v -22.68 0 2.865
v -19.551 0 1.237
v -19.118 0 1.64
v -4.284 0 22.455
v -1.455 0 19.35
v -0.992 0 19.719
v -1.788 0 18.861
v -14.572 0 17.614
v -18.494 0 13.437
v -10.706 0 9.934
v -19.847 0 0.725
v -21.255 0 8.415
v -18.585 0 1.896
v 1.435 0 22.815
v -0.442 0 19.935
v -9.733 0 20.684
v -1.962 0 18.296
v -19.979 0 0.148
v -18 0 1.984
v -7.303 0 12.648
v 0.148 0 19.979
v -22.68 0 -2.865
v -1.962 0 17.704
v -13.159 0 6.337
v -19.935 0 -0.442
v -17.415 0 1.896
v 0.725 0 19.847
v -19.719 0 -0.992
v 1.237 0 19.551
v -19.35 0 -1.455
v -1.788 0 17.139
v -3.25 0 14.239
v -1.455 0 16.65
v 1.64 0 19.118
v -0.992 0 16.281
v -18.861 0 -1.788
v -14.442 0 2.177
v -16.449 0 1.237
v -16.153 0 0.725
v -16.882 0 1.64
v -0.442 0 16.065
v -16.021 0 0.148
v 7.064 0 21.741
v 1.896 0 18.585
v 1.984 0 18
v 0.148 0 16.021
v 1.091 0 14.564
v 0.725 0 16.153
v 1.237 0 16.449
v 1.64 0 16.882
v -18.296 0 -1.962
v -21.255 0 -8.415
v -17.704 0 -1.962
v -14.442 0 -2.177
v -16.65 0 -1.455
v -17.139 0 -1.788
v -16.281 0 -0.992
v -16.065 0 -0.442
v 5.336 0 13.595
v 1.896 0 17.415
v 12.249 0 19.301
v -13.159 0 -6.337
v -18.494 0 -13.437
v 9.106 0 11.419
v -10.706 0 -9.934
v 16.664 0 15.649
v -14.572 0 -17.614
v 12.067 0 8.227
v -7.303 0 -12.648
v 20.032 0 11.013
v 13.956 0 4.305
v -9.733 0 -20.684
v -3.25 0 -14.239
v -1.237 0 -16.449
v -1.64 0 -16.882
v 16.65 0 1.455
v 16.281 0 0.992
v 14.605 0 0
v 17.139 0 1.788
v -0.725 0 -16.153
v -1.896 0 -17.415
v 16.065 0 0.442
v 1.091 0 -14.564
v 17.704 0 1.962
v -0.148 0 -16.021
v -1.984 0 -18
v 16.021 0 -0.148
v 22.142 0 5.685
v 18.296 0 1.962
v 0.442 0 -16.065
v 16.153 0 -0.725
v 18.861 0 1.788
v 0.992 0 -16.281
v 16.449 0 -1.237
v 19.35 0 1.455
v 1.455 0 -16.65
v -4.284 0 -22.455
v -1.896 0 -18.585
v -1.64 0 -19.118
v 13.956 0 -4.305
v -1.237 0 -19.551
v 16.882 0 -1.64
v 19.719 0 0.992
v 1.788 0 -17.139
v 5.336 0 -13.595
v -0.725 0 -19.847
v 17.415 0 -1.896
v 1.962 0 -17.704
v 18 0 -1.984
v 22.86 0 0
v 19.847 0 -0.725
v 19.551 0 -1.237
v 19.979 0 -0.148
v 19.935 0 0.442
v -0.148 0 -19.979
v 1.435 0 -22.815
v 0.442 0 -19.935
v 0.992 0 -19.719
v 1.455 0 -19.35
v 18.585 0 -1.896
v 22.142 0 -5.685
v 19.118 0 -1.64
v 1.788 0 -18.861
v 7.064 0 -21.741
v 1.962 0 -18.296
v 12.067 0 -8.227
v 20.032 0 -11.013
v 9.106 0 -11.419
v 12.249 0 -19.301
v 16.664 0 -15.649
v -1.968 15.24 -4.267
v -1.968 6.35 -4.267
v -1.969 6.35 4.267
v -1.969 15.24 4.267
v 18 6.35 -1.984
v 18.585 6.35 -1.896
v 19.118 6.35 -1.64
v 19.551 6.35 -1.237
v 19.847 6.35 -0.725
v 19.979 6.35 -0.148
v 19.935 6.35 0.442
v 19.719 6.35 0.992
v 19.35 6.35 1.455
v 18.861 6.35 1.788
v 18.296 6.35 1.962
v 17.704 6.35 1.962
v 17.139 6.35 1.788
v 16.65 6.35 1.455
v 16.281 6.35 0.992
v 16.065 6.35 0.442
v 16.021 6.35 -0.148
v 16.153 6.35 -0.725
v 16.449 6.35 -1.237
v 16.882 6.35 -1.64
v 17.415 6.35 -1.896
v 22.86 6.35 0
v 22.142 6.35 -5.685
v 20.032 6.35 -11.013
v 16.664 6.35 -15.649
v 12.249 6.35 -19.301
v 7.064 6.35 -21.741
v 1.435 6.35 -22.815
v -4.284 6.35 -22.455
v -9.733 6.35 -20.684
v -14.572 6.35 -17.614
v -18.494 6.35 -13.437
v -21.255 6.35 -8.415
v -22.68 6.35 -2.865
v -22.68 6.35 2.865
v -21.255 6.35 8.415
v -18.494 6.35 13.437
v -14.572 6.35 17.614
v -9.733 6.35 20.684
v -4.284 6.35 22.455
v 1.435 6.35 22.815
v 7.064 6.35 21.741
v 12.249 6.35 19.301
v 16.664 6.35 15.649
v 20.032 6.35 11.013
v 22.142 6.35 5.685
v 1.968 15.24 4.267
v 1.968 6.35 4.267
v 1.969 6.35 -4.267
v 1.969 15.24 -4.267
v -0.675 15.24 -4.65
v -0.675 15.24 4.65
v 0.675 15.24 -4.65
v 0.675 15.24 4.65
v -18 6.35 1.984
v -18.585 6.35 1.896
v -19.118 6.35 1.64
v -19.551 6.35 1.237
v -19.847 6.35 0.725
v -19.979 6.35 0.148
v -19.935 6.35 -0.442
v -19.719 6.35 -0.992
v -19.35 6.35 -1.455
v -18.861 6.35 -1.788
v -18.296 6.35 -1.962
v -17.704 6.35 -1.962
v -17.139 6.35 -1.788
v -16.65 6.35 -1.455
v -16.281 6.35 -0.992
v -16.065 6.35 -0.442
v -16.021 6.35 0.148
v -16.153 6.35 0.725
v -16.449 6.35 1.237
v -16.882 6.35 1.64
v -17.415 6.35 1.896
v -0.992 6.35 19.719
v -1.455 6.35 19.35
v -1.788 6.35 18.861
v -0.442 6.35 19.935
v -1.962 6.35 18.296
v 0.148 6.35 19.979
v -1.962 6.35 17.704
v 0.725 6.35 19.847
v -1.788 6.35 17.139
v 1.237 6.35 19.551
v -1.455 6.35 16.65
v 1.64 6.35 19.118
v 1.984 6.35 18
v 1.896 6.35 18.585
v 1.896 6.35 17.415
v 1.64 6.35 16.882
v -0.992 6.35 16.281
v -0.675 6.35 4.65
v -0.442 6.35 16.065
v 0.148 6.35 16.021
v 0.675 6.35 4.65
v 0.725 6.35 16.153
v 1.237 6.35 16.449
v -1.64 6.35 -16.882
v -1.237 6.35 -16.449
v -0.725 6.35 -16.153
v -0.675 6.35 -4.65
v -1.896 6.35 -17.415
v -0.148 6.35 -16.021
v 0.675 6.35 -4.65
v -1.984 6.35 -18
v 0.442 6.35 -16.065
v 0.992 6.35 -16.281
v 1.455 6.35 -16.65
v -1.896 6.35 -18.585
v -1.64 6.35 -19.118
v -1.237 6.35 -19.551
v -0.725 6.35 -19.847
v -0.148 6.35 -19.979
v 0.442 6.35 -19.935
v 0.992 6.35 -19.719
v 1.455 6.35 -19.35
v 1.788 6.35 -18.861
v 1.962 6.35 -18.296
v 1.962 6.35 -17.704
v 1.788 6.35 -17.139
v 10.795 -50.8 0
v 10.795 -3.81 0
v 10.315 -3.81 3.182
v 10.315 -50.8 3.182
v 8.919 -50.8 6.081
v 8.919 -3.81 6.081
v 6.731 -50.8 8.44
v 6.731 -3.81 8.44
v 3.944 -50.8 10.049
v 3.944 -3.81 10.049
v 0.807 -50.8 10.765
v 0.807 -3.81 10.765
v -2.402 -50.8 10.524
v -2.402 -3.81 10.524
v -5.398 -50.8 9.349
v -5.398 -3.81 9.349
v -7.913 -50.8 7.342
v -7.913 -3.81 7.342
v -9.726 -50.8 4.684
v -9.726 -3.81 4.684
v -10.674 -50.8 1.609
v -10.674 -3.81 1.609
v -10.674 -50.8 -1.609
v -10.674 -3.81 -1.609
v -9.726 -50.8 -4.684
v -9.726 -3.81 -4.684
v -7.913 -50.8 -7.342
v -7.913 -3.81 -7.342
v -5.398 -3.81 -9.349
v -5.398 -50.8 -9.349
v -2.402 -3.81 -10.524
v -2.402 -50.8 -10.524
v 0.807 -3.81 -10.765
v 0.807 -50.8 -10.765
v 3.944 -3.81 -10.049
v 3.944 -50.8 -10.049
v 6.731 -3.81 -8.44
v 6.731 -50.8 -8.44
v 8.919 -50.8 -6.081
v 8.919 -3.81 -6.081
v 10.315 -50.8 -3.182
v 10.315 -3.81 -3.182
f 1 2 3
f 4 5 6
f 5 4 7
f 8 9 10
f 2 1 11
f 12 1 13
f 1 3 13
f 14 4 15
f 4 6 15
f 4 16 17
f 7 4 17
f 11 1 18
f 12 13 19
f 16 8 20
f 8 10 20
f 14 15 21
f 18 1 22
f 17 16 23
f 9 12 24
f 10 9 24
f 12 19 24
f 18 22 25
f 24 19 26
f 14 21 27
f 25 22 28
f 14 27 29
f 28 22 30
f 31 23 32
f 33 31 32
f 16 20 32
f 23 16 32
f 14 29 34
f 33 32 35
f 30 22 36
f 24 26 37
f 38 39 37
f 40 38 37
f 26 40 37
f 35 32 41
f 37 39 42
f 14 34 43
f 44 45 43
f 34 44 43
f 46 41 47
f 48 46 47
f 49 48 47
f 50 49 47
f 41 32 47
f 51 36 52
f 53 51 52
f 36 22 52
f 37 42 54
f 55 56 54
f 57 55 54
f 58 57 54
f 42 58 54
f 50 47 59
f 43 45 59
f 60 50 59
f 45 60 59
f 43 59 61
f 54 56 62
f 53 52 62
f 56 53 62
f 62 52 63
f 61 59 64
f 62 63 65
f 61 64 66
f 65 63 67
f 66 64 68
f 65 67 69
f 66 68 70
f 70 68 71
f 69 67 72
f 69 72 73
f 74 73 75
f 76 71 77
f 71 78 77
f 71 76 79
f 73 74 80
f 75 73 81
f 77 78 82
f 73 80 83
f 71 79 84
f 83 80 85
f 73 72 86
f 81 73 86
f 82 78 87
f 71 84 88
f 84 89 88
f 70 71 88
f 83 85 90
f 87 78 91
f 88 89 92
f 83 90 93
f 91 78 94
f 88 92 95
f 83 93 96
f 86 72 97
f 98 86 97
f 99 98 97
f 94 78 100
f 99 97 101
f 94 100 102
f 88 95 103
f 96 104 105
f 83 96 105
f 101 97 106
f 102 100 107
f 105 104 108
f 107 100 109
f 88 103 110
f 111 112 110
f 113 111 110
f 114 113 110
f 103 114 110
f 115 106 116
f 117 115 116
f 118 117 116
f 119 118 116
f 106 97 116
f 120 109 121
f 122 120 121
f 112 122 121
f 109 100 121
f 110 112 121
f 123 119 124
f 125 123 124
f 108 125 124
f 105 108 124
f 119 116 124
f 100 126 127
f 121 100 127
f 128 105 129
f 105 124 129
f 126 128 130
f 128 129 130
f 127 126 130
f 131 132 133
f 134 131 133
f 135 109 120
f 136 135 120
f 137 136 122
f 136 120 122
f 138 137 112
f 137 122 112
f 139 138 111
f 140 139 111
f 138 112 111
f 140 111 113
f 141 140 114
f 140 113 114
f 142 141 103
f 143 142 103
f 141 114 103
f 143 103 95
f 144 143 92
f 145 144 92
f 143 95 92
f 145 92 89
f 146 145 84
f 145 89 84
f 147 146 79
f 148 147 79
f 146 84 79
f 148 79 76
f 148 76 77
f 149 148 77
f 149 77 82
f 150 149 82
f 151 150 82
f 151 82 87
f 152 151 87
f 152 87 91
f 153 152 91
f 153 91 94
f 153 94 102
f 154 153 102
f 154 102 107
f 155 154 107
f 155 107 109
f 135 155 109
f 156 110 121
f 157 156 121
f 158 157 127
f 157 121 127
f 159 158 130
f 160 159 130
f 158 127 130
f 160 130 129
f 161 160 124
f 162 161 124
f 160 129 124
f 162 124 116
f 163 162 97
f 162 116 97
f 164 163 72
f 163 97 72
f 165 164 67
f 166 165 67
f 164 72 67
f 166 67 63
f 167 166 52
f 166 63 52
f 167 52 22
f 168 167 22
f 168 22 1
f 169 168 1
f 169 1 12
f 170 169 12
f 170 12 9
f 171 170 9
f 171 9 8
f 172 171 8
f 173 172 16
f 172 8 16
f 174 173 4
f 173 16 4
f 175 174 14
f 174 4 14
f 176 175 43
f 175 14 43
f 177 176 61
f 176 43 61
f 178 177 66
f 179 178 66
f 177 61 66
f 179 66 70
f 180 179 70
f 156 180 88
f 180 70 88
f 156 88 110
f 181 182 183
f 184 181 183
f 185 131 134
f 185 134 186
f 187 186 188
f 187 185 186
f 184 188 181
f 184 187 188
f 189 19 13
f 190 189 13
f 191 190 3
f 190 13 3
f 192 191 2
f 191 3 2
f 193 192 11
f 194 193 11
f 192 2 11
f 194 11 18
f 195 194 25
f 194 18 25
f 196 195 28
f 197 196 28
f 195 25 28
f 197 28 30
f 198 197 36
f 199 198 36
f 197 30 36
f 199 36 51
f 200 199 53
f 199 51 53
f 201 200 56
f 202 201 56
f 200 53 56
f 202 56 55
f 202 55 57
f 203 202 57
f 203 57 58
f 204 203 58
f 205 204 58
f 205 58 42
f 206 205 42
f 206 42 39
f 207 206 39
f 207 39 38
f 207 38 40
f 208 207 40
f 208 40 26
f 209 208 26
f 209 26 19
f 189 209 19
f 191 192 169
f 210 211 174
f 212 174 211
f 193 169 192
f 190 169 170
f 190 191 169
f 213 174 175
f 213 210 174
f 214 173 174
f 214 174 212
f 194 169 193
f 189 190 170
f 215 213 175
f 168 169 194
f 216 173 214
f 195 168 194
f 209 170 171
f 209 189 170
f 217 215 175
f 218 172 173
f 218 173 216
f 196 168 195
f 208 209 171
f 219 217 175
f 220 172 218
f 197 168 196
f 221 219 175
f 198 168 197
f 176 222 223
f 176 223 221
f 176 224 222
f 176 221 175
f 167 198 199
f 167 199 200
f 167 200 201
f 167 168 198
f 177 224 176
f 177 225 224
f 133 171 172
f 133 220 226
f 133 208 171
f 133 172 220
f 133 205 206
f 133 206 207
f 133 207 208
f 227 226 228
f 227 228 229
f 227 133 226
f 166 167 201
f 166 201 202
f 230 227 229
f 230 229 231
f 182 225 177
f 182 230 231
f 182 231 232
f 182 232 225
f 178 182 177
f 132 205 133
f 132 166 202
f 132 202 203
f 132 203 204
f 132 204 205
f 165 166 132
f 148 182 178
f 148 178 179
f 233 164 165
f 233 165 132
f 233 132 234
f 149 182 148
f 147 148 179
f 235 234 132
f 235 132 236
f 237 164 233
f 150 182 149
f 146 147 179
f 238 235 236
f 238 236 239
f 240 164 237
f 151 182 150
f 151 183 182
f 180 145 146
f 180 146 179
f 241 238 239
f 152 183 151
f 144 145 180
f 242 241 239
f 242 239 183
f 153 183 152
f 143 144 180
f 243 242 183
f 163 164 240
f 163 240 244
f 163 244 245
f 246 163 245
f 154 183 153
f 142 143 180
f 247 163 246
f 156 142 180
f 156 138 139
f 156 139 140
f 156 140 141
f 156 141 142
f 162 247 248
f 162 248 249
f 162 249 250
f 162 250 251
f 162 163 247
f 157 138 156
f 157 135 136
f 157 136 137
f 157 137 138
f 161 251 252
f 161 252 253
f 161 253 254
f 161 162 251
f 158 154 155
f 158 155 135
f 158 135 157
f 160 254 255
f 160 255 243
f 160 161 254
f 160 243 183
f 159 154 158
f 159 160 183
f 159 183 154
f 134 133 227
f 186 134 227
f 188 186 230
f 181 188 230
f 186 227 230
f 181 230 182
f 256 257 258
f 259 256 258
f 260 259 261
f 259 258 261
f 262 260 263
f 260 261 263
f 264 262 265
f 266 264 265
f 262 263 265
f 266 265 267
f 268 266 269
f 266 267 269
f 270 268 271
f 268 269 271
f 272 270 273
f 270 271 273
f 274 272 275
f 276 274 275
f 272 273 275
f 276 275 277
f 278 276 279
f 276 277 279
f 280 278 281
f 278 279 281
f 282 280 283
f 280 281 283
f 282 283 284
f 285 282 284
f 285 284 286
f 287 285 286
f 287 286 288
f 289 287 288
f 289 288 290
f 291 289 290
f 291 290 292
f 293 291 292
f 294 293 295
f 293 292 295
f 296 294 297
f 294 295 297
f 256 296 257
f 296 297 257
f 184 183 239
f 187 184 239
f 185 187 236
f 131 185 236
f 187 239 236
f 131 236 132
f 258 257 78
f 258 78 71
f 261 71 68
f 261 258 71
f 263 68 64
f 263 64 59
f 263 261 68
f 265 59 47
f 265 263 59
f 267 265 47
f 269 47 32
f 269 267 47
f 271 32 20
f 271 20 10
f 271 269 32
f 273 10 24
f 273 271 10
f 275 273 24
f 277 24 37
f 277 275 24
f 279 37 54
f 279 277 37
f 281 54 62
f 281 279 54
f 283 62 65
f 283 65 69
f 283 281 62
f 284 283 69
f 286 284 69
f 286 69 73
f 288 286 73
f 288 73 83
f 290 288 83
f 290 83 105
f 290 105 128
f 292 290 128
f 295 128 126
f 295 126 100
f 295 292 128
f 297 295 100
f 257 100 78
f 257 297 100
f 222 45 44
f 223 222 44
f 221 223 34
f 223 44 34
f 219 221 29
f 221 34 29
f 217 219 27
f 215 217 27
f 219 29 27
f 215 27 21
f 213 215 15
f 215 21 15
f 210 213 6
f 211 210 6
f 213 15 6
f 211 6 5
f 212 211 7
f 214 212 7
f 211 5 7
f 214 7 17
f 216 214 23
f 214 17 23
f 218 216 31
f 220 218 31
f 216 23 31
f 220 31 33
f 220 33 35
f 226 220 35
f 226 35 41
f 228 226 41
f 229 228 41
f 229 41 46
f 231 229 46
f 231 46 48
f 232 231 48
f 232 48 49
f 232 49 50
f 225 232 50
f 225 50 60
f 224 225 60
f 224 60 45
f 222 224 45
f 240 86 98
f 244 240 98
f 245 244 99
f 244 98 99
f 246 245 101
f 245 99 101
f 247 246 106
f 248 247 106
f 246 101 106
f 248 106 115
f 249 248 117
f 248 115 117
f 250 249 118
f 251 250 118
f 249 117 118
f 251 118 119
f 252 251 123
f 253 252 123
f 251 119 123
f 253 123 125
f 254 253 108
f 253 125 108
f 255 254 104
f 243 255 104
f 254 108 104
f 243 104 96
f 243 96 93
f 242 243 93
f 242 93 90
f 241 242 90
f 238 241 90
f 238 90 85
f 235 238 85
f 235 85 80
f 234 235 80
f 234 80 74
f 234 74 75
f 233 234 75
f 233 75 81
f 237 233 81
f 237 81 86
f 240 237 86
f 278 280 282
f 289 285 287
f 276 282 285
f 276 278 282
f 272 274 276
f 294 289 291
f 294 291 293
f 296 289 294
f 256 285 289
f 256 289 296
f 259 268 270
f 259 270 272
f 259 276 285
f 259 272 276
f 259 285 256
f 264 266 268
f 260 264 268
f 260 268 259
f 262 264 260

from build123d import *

# Parameters (mm, degrees)
SKETCH1_R                           = 22.86
BOSS_EXTRUDE1_DEPTH                 = 6.35
BOSS_EXTRUDE2_DEPTH                 = 8.89
SKETCH3_R                           = 10.795
BOSS_EXTRUDE3_DEPTH                 = 50.8
CHAMFER1_SIZE                       = 3.81
F_5_32_0_15625_DIAMETER_HOLE1_D     = 3.96875
F_5_32_0_15625_DIAMETER_HOLE1_DEPTH = 6.351
CIRPATTERN1_COUNT                   = 4


with BuildPart() as part:
    # Sketch1 → Boss-Extrude1 (new body)
    with BuildSketch(Plane(origin=(0, 0, 0), x_dir=(1, 0, 0), z_dir=(0, 1, 0))):
        Circle(SKETCH1_R)
    extrude(amount=BOSS_EXTRUDE1_DEPTH)

    # Sketch2 → Boss-Extrude2 (add)
    with BuildSketch(Plane(origin=(0, 6.35, 0), x_dir=(1, 0, 0), z_dir=(0, 1, 0))):
        with BuildLine():
            Line((1.9685, -4.266803107), (1.9685, 4.266803107))
            ThreePointArc((1.9685, 4.266803107), (0, 4.699), (-1.9685, 4.266803107))
            Line((-1.9685, 4.266803107), (-1.9685, -4.266803107))
            ThreePointArc((-1.9685, -4.266803107), (0, -4.699), (1.9685, -4.266803107))
        make_face()
    extrude(amount=BOSS_EXTRUDE2_DEPTH)

    # Sketch3 → Boss-Extrude3 (add)
    with BuildSketch(Plane.XZ):
        Circle(SKETCH3_R)
    extrude(amount=BOSS_EXTRUDE3_DEPTH)

    # Chamfer1
    chamfer1_edges = [part.edges().sort_by_distance(p)[0] for p in [
        (-10.795, 0, 0),
    ]]
    chamfer(chamfer1_edges, length=CHAMFER1_SIZE)

    # 5/32 (0.15625) Diameter Hole1
    with Locations(Plane(origin=(0, 6.35, 0), x_dir=(1, 0, 0), z_dir=(0, 1, 0))):
        with Locations((0, 18)):
            f_5_32_0_15625_diameter_hole1 = Hole(F_5_32_0_15625_DIAMETER_HOLE1_D / 2, depth=F_5_32_0_15625_DIAMETER_HOLE1_DEPTH)

    # CirPattern1: 5/32 (0.15625) Diameter Hole1 ×4 about axis
    cirpattern1_axis = Axis((0, 0, 0), (0, 1, 0))
    for i in range(1, CIRPATTERN1_COUNT):
        add(f_5_32_0_15625_diameter_hole1.rotate(cirpattern1_axis, i * 360 / CIRPATTERN1_COUNT), mode=Mode.SUBTRACT)


solid = part.part
